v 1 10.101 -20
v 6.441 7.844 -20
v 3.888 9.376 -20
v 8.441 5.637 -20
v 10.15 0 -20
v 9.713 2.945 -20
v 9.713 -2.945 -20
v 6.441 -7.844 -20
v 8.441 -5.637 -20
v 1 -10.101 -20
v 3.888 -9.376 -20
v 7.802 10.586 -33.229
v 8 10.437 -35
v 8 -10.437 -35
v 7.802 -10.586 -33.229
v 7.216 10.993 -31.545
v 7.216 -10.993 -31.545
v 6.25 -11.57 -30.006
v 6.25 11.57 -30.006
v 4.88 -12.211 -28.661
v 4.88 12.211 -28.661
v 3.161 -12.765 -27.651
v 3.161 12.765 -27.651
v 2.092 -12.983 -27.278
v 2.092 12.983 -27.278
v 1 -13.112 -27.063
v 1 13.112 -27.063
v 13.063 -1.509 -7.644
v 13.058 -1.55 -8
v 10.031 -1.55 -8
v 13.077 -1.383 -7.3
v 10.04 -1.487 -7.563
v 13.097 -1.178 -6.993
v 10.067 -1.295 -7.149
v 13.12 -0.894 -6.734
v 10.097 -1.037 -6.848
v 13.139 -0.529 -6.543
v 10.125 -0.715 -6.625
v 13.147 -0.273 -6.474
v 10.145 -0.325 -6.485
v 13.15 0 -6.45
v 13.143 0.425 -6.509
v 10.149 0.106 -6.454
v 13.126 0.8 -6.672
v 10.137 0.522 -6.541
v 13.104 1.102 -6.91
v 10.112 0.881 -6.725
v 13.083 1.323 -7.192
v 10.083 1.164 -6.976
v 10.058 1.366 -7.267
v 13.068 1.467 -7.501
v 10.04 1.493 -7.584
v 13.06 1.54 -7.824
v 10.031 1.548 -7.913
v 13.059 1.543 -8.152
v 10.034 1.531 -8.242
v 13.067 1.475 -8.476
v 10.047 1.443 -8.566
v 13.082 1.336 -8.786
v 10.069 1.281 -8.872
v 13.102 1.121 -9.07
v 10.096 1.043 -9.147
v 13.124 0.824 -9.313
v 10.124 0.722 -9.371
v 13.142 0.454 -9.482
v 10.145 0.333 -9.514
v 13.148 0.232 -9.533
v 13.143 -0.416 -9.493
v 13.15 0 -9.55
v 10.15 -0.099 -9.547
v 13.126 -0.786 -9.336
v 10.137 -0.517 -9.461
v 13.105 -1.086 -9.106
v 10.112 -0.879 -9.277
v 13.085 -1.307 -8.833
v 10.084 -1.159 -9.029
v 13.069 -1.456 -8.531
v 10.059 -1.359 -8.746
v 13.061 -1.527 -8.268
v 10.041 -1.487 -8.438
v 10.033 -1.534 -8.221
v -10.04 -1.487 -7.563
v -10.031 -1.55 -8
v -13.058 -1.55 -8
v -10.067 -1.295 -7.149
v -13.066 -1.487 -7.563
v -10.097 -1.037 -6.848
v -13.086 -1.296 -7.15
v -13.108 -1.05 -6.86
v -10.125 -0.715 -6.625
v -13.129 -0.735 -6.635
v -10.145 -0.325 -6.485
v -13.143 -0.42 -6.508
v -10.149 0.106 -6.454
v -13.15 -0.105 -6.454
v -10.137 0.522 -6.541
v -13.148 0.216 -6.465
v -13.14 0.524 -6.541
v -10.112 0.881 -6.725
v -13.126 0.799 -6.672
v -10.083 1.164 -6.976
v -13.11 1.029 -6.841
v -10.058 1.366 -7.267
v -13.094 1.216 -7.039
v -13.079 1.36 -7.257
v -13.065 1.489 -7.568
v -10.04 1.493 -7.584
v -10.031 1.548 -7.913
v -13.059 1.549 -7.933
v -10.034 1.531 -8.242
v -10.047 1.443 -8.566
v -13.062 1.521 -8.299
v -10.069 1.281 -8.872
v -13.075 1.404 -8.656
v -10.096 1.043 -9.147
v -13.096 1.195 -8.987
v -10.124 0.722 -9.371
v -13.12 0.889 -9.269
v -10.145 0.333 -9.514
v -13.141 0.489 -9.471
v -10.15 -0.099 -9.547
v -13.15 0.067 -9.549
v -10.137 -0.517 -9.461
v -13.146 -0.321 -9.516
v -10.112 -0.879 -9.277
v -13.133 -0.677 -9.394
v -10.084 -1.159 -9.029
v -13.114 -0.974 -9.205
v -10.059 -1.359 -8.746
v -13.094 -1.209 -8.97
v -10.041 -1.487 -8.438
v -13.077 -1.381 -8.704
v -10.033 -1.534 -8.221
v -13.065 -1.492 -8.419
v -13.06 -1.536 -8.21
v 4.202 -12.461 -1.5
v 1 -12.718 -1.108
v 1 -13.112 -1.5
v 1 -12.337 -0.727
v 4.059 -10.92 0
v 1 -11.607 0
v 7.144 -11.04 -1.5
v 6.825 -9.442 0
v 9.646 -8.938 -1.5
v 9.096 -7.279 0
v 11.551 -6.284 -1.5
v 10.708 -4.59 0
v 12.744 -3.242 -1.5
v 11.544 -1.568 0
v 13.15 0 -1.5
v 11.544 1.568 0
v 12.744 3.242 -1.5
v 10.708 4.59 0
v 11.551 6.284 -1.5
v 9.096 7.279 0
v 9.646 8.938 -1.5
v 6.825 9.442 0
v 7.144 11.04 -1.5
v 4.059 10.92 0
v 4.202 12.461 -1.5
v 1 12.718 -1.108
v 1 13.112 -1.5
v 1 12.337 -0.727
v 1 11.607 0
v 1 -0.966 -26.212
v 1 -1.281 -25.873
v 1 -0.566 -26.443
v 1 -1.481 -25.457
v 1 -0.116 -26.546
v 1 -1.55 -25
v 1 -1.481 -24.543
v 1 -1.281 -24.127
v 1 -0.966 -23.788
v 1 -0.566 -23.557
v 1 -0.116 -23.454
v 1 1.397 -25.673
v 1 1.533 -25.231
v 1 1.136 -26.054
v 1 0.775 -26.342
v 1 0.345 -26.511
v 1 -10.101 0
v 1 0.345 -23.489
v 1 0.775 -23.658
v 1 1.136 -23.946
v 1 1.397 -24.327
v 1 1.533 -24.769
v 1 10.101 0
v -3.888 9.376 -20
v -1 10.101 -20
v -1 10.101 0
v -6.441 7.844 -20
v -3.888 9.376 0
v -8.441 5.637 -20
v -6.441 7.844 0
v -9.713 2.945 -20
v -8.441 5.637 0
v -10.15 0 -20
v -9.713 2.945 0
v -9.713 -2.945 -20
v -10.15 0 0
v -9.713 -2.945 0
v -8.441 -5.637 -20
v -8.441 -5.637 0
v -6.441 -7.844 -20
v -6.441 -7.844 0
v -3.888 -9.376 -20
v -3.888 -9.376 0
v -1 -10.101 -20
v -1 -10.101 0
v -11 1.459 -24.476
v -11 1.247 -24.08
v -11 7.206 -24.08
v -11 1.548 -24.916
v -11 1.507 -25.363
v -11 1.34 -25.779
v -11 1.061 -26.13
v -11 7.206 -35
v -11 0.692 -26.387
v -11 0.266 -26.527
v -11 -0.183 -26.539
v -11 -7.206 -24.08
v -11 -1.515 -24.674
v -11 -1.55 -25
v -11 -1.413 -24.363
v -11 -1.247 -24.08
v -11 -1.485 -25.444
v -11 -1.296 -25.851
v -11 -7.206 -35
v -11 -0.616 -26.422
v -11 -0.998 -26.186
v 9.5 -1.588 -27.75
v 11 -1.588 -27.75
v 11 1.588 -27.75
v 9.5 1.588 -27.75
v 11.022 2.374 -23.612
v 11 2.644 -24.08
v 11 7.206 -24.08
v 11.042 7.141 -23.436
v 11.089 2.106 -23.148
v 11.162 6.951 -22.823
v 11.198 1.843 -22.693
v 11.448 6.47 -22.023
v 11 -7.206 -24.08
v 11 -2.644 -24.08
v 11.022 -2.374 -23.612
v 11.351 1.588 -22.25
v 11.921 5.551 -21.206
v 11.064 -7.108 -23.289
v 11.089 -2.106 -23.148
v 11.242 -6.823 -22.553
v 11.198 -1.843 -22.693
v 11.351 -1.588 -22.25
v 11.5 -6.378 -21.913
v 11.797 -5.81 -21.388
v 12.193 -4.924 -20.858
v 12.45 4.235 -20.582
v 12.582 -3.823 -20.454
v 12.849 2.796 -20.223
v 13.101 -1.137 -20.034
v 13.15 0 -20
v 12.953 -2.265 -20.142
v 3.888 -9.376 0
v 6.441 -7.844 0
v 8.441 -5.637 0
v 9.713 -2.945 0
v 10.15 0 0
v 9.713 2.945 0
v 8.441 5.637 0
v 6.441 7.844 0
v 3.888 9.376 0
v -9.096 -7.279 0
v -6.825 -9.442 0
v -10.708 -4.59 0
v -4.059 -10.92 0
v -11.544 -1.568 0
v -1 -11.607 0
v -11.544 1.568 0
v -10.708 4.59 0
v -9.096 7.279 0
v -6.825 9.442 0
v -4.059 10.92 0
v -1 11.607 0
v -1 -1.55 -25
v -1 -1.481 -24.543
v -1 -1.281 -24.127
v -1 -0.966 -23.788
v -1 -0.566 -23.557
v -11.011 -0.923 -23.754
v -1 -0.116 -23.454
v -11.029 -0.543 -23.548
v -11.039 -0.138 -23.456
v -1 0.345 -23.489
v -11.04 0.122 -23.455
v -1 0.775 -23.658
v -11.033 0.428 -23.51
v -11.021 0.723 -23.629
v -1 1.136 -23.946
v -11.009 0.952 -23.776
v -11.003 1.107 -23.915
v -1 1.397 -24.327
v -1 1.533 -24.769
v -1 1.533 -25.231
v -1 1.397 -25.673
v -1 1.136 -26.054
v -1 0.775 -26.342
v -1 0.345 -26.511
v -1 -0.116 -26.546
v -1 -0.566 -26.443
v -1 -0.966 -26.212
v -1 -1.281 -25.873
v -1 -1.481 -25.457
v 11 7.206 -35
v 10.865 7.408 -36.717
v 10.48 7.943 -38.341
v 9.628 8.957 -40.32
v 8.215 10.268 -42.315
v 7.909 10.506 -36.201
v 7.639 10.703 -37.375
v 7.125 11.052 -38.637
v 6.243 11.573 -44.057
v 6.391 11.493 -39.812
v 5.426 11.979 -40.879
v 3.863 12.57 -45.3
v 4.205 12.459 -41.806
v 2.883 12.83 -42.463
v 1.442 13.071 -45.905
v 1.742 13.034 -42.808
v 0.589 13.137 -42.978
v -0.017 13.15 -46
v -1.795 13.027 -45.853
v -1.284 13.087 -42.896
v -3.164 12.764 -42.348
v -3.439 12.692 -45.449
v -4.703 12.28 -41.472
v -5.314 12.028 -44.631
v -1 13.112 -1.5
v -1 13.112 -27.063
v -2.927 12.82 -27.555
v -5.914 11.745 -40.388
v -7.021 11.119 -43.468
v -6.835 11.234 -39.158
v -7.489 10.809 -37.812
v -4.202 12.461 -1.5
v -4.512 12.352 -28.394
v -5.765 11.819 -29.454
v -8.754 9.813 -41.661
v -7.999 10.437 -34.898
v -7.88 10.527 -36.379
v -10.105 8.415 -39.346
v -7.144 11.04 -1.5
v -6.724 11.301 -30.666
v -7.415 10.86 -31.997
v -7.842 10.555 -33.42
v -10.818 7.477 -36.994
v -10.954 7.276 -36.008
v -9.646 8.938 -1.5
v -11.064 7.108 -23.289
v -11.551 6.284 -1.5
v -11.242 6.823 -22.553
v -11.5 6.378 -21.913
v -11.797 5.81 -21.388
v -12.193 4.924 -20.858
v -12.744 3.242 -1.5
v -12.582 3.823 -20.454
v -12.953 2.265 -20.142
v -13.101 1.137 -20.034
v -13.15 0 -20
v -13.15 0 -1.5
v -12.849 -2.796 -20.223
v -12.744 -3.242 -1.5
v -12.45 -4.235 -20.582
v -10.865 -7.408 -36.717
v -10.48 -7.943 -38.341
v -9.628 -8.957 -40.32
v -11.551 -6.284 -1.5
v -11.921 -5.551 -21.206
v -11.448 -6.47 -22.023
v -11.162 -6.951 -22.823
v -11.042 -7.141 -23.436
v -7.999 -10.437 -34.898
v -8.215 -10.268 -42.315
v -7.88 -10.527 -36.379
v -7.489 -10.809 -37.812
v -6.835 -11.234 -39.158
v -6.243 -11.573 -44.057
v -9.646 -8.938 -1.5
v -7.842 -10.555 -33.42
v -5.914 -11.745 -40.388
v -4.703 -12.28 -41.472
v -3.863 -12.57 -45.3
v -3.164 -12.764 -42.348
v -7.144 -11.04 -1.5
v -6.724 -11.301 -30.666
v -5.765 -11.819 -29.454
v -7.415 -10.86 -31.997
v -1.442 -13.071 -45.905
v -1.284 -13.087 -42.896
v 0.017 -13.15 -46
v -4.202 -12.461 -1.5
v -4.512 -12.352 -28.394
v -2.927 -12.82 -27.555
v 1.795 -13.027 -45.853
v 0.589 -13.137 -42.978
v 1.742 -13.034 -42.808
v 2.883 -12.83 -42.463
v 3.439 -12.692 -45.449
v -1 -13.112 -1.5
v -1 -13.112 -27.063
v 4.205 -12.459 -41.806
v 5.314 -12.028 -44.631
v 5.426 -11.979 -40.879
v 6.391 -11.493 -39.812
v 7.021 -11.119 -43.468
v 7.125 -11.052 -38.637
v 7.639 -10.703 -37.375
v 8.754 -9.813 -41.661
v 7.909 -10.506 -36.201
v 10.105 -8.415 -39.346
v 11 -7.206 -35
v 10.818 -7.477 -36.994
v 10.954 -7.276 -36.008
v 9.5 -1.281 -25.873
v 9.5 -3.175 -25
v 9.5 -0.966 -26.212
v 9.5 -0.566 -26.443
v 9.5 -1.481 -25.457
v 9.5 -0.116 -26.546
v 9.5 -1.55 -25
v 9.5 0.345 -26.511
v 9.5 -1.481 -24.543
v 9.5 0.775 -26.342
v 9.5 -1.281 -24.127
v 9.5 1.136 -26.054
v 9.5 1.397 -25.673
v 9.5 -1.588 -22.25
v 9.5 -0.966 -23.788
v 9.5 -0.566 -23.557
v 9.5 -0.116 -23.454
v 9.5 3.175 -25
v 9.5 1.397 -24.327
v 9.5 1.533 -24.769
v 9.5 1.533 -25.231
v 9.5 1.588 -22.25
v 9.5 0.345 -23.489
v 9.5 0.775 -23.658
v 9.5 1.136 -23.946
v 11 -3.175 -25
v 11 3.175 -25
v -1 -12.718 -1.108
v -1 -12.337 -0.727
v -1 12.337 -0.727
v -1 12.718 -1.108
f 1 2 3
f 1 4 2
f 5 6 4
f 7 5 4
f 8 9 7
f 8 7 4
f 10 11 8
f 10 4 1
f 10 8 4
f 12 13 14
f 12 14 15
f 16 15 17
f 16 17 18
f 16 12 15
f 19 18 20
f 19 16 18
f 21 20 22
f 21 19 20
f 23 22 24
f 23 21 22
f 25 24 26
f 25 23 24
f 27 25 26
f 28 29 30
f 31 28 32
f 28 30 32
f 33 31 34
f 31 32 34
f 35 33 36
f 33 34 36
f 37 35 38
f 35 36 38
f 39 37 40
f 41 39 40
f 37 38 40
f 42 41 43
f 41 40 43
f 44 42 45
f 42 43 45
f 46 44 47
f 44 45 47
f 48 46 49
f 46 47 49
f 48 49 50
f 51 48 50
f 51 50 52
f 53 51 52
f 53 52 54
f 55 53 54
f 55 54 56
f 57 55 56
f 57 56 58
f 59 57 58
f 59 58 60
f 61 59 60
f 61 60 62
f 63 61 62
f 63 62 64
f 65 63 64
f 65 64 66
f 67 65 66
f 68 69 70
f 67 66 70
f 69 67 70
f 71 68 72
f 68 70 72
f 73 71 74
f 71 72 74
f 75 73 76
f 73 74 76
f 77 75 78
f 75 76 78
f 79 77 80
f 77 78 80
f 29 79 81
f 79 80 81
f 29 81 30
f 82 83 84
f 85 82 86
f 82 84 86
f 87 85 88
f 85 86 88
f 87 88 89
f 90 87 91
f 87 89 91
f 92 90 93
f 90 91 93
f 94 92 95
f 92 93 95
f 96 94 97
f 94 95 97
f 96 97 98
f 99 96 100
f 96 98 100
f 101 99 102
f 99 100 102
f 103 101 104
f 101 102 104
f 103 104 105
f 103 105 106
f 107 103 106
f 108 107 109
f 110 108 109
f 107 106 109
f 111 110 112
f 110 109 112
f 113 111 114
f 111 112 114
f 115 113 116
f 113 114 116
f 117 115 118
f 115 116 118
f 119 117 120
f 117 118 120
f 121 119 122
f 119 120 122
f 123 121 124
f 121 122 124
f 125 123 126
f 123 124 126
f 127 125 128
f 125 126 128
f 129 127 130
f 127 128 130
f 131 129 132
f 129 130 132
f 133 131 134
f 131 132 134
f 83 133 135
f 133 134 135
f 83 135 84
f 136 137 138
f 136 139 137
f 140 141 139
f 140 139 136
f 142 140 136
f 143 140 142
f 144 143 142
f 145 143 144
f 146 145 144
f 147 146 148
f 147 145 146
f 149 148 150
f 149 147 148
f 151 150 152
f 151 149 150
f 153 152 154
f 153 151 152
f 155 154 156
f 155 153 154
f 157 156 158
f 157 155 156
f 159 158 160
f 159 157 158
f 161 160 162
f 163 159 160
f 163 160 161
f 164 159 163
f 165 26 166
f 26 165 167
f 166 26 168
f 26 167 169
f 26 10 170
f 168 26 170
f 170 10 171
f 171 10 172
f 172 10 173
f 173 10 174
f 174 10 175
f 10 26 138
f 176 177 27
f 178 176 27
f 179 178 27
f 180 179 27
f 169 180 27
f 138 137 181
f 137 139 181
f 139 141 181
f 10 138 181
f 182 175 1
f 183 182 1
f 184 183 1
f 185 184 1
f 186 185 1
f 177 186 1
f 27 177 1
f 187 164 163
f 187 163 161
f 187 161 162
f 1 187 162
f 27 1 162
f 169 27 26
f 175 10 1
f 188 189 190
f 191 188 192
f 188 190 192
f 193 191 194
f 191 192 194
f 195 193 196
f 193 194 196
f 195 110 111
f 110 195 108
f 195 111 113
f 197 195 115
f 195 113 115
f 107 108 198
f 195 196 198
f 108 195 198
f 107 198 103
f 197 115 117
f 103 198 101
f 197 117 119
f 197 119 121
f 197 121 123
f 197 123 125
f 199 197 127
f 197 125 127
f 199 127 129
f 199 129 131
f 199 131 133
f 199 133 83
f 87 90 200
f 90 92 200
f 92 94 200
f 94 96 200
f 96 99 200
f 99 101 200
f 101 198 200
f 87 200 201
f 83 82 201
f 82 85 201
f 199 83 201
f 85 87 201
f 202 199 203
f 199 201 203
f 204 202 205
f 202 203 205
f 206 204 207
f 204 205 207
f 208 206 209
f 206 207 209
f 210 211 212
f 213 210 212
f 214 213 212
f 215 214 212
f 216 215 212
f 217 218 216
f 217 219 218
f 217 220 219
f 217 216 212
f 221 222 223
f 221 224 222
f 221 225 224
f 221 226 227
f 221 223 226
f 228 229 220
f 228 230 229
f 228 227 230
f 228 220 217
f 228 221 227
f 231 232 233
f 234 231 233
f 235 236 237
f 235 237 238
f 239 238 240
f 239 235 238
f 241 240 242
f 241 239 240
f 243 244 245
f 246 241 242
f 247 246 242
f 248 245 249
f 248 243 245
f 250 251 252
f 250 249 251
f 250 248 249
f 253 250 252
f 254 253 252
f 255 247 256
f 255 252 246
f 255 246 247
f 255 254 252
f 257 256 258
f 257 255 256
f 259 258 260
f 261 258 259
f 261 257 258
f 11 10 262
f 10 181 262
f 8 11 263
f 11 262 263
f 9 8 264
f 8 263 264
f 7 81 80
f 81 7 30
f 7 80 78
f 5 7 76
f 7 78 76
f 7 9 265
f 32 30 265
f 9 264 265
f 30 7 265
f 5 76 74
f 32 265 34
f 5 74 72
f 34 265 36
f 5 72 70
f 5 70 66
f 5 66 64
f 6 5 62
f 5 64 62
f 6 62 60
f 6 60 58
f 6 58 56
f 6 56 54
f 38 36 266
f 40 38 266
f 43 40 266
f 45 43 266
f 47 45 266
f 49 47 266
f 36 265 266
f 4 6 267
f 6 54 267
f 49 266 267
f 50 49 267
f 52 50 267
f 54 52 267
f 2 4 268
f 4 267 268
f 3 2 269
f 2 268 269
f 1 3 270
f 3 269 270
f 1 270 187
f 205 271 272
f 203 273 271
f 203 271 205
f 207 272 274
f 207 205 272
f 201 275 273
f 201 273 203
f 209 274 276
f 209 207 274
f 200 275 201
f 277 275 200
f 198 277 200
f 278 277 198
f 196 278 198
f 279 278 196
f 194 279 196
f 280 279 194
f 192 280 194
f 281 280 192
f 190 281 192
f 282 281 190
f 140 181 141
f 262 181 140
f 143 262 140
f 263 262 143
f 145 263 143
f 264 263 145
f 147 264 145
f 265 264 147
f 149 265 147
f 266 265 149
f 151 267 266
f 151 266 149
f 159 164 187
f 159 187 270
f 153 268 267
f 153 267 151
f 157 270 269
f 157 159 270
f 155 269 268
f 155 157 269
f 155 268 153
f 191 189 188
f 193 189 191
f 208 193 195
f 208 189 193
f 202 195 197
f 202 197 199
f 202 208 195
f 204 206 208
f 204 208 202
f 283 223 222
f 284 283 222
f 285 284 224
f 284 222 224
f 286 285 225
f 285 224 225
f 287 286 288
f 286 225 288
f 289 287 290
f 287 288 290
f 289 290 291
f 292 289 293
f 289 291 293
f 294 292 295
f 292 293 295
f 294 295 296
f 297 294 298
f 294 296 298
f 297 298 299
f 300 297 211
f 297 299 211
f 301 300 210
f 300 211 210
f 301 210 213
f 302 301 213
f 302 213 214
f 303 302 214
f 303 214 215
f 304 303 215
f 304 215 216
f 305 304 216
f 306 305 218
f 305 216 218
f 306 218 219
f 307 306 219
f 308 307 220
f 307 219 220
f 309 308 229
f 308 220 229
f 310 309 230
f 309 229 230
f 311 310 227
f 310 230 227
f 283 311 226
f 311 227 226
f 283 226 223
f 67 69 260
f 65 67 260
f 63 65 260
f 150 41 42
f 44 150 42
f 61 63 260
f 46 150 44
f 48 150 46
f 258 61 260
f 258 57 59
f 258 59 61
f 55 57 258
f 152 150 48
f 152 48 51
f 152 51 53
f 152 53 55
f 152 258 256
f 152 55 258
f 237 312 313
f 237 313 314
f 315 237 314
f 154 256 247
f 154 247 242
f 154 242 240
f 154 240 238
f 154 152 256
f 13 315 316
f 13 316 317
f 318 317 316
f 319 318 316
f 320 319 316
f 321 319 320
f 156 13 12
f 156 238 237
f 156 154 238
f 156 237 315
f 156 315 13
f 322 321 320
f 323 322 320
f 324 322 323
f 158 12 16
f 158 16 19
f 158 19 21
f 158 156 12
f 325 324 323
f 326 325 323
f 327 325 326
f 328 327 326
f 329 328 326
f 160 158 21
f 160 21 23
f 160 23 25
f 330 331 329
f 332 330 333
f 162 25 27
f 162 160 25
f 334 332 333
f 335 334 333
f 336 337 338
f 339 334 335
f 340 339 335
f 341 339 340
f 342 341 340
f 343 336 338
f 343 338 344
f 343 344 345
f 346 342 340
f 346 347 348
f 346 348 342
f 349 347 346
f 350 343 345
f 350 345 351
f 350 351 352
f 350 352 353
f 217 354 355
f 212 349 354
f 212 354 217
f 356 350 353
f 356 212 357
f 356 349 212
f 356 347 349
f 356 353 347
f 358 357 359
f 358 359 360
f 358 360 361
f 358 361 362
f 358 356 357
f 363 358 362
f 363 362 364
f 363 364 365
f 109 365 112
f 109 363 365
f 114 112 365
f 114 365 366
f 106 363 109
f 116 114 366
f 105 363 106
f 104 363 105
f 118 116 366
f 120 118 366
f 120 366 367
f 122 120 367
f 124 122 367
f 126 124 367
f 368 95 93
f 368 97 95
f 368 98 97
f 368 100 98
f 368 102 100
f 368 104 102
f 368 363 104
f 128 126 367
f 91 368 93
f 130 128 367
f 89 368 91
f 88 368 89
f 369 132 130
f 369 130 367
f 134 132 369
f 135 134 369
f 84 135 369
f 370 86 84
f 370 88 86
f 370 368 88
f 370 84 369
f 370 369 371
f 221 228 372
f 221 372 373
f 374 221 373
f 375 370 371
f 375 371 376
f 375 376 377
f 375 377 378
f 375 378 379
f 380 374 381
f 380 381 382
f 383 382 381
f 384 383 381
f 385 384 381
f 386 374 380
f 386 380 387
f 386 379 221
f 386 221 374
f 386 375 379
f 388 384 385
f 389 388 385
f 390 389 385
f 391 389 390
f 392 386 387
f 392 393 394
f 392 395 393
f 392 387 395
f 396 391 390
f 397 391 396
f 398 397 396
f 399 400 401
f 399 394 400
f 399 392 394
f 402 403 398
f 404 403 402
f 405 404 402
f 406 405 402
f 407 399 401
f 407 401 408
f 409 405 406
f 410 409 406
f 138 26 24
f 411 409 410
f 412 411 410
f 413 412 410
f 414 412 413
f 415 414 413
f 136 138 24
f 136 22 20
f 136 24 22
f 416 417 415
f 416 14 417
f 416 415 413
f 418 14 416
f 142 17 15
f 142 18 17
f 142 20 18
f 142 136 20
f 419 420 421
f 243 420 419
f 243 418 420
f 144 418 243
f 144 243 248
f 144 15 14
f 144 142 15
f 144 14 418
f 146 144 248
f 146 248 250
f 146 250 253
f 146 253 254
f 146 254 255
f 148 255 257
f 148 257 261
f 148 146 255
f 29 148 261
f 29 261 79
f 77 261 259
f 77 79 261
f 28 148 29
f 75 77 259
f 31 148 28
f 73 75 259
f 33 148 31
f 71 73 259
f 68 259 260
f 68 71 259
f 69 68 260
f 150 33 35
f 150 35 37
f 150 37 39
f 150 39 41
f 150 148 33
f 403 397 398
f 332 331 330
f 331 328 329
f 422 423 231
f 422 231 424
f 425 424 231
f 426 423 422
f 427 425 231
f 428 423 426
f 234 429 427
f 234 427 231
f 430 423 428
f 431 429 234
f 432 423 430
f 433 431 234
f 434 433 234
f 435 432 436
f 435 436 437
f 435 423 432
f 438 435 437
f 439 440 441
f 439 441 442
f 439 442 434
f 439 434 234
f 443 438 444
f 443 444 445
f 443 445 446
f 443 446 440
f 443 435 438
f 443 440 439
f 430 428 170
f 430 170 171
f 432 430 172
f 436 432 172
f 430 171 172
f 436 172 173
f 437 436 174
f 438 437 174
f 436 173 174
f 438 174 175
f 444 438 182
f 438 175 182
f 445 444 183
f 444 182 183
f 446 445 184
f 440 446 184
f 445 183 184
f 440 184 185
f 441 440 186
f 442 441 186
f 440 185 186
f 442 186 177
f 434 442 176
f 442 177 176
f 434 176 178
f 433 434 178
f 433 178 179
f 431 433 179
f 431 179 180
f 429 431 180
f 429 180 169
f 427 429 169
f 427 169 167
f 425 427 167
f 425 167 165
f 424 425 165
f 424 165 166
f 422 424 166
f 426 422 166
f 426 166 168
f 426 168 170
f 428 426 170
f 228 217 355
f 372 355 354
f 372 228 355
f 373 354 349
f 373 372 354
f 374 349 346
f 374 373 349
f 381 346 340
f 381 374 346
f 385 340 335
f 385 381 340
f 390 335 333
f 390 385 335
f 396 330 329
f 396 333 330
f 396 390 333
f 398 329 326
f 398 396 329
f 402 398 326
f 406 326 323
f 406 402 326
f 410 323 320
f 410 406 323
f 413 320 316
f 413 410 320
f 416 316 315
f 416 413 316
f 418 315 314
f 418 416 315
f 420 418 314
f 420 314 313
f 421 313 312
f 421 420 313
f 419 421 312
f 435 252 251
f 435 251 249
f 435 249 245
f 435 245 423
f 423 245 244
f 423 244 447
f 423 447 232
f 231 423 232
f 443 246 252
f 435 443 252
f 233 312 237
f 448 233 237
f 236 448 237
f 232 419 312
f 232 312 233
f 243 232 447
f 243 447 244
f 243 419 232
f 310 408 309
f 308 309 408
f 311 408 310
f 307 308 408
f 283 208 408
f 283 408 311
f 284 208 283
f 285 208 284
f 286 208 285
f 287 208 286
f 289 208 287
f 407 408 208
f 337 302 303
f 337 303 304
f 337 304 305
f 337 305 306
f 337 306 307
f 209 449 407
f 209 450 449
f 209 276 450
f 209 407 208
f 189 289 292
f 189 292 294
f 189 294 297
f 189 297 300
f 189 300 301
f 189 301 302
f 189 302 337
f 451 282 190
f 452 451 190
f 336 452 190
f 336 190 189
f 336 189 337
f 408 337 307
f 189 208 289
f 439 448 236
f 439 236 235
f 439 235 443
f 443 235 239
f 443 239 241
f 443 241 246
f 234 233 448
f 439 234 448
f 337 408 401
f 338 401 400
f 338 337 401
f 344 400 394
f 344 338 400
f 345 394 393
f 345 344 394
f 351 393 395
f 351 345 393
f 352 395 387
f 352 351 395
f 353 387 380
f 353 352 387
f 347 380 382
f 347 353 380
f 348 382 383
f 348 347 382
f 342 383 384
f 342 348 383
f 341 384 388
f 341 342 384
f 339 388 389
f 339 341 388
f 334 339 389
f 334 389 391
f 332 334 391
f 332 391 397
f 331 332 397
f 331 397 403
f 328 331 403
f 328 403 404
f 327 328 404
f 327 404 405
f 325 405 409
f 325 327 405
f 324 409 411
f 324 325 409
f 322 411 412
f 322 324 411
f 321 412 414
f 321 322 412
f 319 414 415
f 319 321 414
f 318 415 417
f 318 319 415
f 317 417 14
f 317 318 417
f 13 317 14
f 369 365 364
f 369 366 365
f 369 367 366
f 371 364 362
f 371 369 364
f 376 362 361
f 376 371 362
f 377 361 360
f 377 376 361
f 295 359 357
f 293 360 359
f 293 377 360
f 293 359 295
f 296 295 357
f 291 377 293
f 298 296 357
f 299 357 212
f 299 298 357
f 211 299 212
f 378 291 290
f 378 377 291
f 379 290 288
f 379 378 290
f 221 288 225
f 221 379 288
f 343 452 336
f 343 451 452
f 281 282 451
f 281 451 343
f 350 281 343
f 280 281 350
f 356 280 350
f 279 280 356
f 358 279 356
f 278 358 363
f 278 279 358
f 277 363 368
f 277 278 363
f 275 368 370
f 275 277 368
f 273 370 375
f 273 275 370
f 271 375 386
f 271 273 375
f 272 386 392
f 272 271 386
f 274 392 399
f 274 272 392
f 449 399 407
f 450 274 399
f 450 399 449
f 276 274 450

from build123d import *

# Parameters (mm, degrees)
F0_R      = 13.15
F0_R_2    = 10.15
F1_DEPTH  = 20
F2_R      = 8
F3_DEPTH  = 22.5
F4_R      = 40.4098259217
F4_R_2    = 13.15
F5_DEPTH  = 50
F6_W      = 2
F6_H      = 35
F7_DEPTH  = 31.2572
F8_SIZE   = 1.5
F9_R      = 1.55
F10_DEPTH = 30.51178
F12_DEPTH = 1.5


with BuildPart() as f1:
    # F0 (on Top) → F1 (new body)
    with BuildSketch(Plane.XY):
        Circle(F0_R)
        Circle(F0_R_2, mode=Mode.SUBTRACT)
    extrude(amount=-F1_DEPTH)

    # F2 (on Front) → F3 (join, symmetric)
    with BuildSketch(Plane.XZ):
        with BuildLine():
            ThreePointArc((-11, -35), (0, -46), (11, -35))
            ThreePointArc((11, -35), (0, -24), (-11, -35))
        make_face()
        with Locations((0, -35)):
            Circle(F2_R, mode=Mode.SUBTRACT)
        with BuildLine():
            ThreePointArc((-11, -35), (0, -24), (11, -35))
            Line((11, -35), (11, -24.0798275918))
            ThreePointArc((11, -24.0798275918), (11.5703901789, -21.7739929718), (13.15, -20))
            Line((13.15, -20), (-13.15, -20))
            ThreePointArc((-13.15, -20), (-11.5703901789, -21.7739929718), (-11, -24.0798275918))
            Line((-11, -24.0798275918), (-11, -35))
        make_face()
    extrude(amount=F3_DEPTH, both=True)

    # F4 (on face) → F5 (cut)
    with BuildSketch(Plane.XY):
        Circle(F4_R)
        Circle(F4_R_2, mode=Mode.SUBTRACT)
    extrude(amount=-F5_DEPTH, mode=Mode.SUBTRACT)

    # F6 (on face) → F7 (cut)
    with BuildSketch(Plane.XY):
        Rectangle(F6_W, F6_H)
    extrude(amount=-F7_DEPTH, mode=Mode.SUBTRACT)

    # F8
    f8_edges = [f1.edges().sort_by_distance(p)[0] for p in [
        (-13.15, 0, 0),
        (9.64553, 8.937911, 0),
        (9.64553, -8.937911, 0),
    ]]
    chamfer(f8_edges, length=F8_SIZE)

    # F9 (on face) → F10 (cut, symmetric)
    with BuildSketch(Plane(origin=(-11, 0, 0), x_dir=(0, -1, 0), z_dir=(-1, 0, 0))):
        with Locations((0, -25)):
            Circle(F9_R)
        with Locations((0, -8)):
            Circle(F9_R)
    extrude(amount=F10_DEPTH, both=True, mode=Mode.SUBTRACT)

    # F11 (on face) → F12 (cut, symmetric)
    with BuildSketch(Plane.YZ.offset(11)):
        Polygon((1.5877132403, -22.25), (-1.5877132403, -22.25), (-3.1754264805, -25), (-1.5877132403, -27.75), (1.5877132403, -27.75), (3.1754264805, -25), align=None)
    extrude(amount=F12_DEPTH, both=True, mode=Mode.SUBTRACT)


solid = f1.part
